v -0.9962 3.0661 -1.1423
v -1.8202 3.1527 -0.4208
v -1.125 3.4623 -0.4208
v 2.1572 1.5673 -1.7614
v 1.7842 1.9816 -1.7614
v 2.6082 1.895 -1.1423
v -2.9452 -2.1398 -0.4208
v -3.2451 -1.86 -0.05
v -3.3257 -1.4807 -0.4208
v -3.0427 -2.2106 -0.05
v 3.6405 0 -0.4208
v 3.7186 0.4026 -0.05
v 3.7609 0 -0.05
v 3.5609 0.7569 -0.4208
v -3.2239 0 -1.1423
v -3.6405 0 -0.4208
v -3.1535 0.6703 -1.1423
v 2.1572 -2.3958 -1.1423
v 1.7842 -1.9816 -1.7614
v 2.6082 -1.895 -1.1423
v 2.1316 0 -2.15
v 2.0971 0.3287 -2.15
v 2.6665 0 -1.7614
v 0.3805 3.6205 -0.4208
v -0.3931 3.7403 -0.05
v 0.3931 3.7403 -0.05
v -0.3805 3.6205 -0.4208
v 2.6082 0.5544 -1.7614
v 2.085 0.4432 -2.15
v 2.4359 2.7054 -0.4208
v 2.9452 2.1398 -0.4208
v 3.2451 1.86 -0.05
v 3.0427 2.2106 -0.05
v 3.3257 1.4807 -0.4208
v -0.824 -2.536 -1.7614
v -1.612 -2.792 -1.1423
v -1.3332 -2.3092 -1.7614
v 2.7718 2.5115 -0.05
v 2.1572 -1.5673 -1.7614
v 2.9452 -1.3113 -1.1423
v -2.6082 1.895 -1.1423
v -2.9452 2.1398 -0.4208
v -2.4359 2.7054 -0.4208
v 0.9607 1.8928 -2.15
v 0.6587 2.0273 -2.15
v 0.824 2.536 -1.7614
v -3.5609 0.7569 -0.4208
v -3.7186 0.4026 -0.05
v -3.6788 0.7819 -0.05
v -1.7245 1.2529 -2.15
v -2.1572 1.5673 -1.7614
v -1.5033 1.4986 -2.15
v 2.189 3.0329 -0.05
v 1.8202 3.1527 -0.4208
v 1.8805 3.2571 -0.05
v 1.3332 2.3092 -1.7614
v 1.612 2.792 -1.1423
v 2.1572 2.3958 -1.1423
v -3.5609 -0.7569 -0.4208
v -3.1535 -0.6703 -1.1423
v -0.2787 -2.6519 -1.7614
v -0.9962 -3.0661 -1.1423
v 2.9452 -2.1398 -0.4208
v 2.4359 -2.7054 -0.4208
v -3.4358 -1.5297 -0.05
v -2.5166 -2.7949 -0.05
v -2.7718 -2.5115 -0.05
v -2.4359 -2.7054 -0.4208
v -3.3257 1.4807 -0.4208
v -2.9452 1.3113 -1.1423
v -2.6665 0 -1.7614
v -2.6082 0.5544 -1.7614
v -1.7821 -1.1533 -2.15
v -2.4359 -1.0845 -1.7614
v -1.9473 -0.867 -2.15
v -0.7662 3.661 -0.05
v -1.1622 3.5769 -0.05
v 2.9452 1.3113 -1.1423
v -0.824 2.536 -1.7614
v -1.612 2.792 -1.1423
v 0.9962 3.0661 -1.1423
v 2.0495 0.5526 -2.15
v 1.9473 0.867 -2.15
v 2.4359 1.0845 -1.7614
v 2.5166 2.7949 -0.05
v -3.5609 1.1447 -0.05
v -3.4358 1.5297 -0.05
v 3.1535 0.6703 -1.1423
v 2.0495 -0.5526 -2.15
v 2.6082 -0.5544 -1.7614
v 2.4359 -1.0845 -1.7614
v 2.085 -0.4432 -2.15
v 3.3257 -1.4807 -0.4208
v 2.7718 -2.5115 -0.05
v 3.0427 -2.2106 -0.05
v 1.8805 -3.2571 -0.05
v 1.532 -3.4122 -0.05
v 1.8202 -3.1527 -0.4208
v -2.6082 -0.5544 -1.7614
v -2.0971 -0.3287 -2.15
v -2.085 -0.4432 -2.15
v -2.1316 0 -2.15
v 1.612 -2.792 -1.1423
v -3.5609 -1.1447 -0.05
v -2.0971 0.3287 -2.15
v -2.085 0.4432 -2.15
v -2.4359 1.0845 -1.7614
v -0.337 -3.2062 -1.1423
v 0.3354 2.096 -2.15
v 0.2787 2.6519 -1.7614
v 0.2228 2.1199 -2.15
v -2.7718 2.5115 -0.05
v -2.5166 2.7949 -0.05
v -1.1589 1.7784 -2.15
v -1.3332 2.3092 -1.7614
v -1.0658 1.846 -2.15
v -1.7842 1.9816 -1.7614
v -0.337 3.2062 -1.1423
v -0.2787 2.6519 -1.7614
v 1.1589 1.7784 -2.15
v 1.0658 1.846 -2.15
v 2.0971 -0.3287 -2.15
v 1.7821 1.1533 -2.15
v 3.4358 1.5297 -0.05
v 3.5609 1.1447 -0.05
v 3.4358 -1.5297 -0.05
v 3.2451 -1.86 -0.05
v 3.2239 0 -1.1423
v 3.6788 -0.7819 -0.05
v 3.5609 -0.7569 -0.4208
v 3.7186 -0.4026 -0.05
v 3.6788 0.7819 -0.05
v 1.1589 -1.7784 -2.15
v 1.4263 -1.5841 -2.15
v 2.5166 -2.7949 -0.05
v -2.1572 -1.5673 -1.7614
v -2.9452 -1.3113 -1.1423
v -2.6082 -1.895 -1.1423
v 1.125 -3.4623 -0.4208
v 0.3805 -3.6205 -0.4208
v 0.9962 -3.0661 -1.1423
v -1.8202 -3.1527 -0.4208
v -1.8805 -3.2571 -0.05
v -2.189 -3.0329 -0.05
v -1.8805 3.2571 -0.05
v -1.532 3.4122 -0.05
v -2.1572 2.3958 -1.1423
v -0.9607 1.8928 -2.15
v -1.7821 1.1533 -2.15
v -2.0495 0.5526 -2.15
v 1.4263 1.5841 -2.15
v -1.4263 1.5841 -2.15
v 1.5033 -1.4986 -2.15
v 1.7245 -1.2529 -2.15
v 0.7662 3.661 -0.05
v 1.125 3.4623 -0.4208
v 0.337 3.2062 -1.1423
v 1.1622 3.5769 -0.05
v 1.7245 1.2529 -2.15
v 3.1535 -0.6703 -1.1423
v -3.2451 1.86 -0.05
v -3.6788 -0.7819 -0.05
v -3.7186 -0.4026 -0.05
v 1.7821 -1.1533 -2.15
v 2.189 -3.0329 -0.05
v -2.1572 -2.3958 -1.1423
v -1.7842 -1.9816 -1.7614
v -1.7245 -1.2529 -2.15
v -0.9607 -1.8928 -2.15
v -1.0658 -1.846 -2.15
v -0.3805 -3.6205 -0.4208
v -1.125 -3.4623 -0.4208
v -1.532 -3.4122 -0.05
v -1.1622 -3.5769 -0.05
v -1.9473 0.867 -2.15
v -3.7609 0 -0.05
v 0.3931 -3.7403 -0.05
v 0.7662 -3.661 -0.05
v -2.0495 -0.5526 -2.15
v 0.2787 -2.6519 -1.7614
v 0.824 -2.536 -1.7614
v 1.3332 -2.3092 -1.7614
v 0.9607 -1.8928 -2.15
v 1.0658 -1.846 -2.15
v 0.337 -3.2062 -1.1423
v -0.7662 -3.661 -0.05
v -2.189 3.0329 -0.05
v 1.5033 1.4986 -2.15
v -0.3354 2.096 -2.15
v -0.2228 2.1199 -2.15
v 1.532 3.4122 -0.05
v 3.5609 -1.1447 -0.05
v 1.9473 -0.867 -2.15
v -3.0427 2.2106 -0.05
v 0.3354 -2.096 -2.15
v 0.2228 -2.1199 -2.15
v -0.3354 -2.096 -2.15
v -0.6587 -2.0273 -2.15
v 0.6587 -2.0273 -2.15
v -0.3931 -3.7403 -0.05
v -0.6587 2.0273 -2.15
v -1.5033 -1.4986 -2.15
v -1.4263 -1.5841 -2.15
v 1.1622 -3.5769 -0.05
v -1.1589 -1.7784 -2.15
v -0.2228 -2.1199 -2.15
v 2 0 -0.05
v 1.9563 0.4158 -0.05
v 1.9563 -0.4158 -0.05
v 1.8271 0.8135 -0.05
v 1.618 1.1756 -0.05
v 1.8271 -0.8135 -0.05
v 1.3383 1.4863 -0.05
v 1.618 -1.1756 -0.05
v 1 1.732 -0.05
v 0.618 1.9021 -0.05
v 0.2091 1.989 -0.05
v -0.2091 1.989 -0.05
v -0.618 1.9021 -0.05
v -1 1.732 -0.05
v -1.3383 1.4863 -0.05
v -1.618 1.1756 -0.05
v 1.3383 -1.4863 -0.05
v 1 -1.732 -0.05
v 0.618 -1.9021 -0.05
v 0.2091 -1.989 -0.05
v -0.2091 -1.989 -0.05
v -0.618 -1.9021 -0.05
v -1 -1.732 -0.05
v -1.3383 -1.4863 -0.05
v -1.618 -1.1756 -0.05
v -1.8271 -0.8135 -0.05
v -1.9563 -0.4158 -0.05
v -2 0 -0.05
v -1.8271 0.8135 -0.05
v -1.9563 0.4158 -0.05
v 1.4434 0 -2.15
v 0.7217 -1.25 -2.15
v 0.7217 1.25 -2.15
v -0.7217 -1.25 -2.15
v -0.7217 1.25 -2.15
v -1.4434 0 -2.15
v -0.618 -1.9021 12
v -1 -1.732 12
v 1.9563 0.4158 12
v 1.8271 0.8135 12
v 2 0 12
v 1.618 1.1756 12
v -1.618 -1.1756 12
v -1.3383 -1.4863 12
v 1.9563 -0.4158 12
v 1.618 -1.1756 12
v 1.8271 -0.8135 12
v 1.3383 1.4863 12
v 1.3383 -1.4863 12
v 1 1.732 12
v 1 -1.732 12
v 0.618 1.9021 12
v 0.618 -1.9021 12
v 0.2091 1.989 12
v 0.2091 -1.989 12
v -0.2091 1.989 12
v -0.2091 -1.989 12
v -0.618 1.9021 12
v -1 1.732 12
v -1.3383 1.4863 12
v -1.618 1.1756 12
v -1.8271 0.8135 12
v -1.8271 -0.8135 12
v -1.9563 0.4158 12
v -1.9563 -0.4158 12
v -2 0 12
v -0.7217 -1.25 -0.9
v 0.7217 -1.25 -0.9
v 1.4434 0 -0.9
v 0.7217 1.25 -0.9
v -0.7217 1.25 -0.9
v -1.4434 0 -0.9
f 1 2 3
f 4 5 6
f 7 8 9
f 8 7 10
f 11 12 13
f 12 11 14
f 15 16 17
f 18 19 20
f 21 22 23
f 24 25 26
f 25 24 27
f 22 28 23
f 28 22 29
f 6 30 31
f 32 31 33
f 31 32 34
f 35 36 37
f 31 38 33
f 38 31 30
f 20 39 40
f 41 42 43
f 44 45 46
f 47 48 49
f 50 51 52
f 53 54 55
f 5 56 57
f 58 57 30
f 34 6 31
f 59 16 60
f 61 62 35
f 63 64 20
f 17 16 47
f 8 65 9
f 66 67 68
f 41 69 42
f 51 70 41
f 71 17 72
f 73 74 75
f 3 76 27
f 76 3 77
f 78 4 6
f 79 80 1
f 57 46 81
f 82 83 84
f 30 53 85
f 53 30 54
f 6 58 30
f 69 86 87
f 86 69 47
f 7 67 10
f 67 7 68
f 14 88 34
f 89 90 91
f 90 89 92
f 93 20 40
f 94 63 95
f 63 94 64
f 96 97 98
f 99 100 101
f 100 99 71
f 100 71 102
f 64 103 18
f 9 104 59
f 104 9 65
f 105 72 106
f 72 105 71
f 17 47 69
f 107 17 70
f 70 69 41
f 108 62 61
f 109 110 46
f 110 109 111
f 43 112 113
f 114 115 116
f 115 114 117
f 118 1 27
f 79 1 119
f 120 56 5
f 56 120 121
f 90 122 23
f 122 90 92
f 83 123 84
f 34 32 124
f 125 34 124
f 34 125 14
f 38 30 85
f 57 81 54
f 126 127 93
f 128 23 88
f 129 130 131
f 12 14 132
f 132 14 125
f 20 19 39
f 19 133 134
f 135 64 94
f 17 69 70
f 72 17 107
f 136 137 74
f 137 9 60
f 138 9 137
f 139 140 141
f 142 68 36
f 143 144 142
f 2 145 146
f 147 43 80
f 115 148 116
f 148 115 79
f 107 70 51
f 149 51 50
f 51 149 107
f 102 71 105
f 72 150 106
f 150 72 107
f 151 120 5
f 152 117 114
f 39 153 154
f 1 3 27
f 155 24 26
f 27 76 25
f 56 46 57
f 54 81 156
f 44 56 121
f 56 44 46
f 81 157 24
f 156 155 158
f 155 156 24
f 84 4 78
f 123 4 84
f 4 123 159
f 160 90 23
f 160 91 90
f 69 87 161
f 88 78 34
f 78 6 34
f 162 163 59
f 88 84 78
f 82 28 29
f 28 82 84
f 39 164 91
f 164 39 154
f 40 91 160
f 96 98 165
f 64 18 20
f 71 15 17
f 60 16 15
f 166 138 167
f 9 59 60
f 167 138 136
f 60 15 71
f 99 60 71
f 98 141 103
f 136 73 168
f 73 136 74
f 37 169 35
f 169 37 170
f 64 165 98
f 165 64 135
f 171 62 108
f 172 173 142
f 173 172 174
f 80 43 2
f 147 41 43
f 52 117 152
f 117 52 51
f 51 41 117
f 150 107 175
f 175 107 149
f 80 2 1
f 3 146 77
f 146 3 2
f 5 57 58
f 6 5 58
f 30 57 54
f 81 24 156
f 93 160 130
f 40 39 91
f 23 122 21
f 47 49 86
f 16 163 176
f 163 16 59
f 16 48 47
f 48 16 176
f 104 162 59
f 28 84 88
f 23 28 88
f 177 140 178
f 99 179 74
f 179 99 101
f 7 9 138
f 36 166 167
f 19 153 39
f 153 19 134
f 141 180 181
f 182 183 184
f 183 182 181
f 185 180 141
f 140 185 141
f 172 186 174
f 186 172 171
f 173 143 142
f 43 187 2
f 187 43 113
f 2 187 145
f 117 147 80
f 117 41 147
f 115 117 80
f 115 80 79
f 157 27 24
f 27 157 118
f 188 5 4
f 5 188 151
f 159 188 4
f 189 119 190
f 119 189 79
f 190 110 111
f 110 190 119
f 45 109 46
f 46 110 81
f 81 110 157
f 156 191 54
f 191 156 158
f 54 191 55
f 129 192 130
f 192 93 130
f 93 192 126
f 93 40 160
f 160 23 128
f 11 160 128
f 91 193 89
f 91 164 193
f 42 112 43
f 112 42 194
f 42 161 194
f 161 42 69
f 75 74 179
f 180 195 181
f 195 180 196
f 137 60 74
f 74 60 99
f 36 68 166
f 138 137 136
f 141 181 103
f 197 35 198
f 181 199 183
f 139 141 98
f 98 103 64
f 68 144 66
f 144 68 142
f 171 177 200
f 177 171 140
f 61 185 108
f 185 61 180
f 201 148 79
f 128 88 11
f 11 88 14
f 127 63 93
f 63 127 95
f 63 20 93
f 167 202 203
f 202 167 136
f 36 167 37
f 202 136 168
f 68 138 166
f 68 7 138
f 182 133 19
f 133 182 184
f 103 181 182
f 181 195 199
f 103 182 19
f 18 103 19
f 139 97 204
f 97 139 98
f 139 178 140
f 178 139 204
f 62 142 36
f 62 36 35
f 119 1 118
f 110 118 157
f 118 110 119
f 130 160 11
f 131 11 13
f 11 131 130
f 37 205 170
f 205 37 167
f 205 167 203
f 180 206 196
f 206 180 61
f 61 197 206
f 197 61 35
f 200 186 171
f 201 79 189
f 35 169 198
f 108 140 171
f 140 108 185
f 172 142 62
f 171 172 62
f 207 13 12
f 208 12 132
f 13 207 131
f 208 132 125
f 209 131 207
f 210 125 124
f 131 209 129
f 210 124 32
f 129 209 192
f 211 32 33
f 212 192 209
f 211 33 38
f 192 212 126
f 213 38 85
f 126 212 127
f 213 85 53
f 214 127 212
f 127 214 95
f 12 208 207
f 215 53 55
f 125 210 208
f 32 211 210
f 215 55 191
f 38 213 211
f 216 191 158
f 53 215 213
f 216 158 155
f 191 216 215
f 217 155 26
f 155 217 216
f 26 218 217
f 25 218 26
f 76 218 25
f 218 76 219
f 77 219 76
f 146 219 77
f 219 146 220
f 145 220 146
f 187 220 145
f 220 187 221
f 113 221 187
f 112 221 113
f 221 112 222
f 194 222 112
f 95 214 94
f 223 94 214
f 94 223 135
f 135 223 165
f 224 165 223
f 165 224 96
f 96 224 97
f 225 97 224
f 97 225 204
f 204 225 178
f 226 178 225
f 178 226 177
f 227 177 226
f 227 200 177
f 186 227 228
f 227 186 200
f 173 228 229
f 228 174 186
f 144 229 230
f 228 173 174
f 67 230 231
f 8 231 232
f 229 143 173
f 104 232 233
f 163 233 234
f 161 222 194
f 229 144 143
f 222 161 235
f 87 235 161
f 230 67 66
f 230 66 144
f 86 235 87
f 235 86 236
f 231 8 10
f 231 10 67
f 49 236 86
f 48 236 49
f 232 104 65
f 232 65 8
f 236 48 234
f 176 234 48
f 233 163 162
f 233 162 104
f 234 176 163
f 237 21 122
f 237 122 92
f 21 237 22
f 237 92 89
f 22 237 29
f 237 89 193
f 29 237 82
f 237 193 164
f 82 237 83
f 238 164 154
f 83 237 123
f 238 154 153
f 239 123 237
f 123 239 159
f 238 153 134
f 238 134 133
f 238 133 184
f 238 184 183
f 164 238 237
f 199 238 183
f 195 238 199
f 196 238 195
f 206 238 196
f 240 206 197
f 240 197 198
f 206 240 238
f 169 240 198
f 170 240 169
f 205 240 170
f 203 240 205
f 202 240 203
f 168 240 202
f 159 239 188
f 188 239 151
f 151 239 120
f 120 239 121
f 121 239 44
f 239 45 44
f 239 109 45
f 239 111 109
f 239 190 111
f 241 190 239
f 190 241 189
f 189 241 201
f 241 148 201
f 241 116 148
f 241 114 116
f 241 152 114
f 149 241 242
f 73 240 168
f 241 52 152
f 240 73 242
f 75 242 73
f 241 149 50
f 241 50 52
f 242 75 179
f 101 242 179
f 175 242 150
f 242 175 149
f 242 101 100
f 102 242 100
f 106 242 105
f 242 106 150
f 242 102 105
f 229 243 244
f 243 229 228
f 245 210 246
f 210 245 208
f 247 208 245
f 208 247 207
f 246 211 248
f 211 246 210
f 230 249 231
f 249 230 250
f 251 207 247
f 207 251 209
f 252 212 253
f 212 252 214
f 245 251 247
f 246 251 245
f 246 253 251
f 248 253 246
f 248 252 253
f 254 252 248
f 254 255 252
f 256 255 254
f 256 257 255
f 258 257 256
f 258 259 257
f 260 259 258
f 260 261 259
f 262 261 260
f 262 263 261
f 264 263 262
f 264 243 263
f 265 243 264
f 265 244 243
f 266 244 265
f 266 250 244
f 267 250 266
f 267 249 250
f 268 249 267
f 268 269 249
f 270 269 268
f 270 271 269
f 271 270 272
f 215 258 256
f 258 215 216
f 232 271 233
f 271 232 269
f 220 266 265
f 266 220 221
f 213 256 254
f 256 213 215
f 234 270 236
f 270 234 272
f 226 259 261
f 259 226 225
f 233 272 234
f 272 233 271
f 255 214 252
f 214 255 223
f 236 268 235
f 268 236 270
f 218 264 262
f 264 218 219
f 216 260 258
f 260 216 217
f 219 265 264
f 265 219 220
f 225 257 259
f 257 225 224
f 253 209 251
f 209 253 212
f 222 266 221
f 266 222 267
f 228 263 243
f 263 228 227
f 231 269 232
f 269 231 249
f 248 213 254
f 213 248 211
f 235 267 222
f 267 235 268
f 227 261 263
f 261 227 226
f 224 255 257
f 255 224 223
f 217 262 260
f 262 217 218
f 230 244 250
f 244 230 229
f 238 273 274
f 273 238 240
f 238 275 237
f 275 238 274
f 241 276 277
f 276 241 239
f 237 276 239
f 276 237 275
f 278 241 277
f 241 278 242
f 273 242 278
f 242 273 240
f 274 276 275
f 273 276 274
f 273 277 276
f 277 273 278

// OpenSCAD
/*
   Copyright 2018 Scott Bezek and the splitflap contributors

   Licensed under the Apache License, Version 2.0 (the "License");
   you may not use this file except in compliance with the License.
   You may obtain a copy of the License at

       http://www.apache.org/licenses/LICENSE-2.0

   Unless required by applicable law or agreed to in writing, software
   distributed under the License is distributed on an "AS IS" BASIS,
   WITHOUT WARRANTIES OR CONDITIONS OF ANY KIND, either express or implied.
   See the License for the specific language governing permissions and
   limitations under the License.
*/

module roughM4_7380(length) {
    eps = 0.1;
    thread_diameter = 4;
    head_diameter = 7.6;
    head_length = 2.2;
    driving_depth = 1.3;
    driving_apothem = 2.5/2;
    driving_radius = driving_apothem / cos(180/6);

    sphere_offset = 1.2;  // Just a guess
    sphere_radius = sqrt(sphere_offset*sphere_offset + (head_diameter/2)*(head_diameter/2));


    difference() {
        union() {
            translate([0, 0, -eps]) {
                cylinder(h=length+eps, d=thread_diameter, $fn=30);
            }
            difference() {
                translate([0, 0, sphere_offset]) {
                    sphere(sphere_radius, $fn=30);
                }
                translate([0, 0, sphere_radius]) {
                    cube([sphere_radius*2 + eps, sphere_radius*2 + eps, sphere_radius*2 + eps], center=true);
                }
                translate([0, 0, -sphere_radius - head_length]) {
                    cube([sphere_radius*2 + eps, sphere_radius*2 + eps, sphere_radius*2 + eps], center=true);
                }
            }
        }
        translate([0, 0, -head_length-eps]) {
            cylinder(h=driving_depth+eps, r=driving_radius, $fn=6);
        }
    }
}

roughM4_7380(12);

        module color_selector(c) {
            precision = 0.0000001;  // arbitrary
            function compare_floats(x, y, i=0) = 
                  (len(x) != len(y)) ? false  // if arrays differ in length, they can't be equal
                : (i >= len(x)) ? true  // if we've hit the end of the arrays without issue, we're equal
                : (x[i] - precision <= y[i]) && x[i] + precision >= y[i]
                    ? compare_floats(x, y, i+1)
                    : false;  // not equal, short circuit

            if (c == [1, 0, 0] || compare_floats(c, [1, 0, 0]))
                children();
        }
                    
